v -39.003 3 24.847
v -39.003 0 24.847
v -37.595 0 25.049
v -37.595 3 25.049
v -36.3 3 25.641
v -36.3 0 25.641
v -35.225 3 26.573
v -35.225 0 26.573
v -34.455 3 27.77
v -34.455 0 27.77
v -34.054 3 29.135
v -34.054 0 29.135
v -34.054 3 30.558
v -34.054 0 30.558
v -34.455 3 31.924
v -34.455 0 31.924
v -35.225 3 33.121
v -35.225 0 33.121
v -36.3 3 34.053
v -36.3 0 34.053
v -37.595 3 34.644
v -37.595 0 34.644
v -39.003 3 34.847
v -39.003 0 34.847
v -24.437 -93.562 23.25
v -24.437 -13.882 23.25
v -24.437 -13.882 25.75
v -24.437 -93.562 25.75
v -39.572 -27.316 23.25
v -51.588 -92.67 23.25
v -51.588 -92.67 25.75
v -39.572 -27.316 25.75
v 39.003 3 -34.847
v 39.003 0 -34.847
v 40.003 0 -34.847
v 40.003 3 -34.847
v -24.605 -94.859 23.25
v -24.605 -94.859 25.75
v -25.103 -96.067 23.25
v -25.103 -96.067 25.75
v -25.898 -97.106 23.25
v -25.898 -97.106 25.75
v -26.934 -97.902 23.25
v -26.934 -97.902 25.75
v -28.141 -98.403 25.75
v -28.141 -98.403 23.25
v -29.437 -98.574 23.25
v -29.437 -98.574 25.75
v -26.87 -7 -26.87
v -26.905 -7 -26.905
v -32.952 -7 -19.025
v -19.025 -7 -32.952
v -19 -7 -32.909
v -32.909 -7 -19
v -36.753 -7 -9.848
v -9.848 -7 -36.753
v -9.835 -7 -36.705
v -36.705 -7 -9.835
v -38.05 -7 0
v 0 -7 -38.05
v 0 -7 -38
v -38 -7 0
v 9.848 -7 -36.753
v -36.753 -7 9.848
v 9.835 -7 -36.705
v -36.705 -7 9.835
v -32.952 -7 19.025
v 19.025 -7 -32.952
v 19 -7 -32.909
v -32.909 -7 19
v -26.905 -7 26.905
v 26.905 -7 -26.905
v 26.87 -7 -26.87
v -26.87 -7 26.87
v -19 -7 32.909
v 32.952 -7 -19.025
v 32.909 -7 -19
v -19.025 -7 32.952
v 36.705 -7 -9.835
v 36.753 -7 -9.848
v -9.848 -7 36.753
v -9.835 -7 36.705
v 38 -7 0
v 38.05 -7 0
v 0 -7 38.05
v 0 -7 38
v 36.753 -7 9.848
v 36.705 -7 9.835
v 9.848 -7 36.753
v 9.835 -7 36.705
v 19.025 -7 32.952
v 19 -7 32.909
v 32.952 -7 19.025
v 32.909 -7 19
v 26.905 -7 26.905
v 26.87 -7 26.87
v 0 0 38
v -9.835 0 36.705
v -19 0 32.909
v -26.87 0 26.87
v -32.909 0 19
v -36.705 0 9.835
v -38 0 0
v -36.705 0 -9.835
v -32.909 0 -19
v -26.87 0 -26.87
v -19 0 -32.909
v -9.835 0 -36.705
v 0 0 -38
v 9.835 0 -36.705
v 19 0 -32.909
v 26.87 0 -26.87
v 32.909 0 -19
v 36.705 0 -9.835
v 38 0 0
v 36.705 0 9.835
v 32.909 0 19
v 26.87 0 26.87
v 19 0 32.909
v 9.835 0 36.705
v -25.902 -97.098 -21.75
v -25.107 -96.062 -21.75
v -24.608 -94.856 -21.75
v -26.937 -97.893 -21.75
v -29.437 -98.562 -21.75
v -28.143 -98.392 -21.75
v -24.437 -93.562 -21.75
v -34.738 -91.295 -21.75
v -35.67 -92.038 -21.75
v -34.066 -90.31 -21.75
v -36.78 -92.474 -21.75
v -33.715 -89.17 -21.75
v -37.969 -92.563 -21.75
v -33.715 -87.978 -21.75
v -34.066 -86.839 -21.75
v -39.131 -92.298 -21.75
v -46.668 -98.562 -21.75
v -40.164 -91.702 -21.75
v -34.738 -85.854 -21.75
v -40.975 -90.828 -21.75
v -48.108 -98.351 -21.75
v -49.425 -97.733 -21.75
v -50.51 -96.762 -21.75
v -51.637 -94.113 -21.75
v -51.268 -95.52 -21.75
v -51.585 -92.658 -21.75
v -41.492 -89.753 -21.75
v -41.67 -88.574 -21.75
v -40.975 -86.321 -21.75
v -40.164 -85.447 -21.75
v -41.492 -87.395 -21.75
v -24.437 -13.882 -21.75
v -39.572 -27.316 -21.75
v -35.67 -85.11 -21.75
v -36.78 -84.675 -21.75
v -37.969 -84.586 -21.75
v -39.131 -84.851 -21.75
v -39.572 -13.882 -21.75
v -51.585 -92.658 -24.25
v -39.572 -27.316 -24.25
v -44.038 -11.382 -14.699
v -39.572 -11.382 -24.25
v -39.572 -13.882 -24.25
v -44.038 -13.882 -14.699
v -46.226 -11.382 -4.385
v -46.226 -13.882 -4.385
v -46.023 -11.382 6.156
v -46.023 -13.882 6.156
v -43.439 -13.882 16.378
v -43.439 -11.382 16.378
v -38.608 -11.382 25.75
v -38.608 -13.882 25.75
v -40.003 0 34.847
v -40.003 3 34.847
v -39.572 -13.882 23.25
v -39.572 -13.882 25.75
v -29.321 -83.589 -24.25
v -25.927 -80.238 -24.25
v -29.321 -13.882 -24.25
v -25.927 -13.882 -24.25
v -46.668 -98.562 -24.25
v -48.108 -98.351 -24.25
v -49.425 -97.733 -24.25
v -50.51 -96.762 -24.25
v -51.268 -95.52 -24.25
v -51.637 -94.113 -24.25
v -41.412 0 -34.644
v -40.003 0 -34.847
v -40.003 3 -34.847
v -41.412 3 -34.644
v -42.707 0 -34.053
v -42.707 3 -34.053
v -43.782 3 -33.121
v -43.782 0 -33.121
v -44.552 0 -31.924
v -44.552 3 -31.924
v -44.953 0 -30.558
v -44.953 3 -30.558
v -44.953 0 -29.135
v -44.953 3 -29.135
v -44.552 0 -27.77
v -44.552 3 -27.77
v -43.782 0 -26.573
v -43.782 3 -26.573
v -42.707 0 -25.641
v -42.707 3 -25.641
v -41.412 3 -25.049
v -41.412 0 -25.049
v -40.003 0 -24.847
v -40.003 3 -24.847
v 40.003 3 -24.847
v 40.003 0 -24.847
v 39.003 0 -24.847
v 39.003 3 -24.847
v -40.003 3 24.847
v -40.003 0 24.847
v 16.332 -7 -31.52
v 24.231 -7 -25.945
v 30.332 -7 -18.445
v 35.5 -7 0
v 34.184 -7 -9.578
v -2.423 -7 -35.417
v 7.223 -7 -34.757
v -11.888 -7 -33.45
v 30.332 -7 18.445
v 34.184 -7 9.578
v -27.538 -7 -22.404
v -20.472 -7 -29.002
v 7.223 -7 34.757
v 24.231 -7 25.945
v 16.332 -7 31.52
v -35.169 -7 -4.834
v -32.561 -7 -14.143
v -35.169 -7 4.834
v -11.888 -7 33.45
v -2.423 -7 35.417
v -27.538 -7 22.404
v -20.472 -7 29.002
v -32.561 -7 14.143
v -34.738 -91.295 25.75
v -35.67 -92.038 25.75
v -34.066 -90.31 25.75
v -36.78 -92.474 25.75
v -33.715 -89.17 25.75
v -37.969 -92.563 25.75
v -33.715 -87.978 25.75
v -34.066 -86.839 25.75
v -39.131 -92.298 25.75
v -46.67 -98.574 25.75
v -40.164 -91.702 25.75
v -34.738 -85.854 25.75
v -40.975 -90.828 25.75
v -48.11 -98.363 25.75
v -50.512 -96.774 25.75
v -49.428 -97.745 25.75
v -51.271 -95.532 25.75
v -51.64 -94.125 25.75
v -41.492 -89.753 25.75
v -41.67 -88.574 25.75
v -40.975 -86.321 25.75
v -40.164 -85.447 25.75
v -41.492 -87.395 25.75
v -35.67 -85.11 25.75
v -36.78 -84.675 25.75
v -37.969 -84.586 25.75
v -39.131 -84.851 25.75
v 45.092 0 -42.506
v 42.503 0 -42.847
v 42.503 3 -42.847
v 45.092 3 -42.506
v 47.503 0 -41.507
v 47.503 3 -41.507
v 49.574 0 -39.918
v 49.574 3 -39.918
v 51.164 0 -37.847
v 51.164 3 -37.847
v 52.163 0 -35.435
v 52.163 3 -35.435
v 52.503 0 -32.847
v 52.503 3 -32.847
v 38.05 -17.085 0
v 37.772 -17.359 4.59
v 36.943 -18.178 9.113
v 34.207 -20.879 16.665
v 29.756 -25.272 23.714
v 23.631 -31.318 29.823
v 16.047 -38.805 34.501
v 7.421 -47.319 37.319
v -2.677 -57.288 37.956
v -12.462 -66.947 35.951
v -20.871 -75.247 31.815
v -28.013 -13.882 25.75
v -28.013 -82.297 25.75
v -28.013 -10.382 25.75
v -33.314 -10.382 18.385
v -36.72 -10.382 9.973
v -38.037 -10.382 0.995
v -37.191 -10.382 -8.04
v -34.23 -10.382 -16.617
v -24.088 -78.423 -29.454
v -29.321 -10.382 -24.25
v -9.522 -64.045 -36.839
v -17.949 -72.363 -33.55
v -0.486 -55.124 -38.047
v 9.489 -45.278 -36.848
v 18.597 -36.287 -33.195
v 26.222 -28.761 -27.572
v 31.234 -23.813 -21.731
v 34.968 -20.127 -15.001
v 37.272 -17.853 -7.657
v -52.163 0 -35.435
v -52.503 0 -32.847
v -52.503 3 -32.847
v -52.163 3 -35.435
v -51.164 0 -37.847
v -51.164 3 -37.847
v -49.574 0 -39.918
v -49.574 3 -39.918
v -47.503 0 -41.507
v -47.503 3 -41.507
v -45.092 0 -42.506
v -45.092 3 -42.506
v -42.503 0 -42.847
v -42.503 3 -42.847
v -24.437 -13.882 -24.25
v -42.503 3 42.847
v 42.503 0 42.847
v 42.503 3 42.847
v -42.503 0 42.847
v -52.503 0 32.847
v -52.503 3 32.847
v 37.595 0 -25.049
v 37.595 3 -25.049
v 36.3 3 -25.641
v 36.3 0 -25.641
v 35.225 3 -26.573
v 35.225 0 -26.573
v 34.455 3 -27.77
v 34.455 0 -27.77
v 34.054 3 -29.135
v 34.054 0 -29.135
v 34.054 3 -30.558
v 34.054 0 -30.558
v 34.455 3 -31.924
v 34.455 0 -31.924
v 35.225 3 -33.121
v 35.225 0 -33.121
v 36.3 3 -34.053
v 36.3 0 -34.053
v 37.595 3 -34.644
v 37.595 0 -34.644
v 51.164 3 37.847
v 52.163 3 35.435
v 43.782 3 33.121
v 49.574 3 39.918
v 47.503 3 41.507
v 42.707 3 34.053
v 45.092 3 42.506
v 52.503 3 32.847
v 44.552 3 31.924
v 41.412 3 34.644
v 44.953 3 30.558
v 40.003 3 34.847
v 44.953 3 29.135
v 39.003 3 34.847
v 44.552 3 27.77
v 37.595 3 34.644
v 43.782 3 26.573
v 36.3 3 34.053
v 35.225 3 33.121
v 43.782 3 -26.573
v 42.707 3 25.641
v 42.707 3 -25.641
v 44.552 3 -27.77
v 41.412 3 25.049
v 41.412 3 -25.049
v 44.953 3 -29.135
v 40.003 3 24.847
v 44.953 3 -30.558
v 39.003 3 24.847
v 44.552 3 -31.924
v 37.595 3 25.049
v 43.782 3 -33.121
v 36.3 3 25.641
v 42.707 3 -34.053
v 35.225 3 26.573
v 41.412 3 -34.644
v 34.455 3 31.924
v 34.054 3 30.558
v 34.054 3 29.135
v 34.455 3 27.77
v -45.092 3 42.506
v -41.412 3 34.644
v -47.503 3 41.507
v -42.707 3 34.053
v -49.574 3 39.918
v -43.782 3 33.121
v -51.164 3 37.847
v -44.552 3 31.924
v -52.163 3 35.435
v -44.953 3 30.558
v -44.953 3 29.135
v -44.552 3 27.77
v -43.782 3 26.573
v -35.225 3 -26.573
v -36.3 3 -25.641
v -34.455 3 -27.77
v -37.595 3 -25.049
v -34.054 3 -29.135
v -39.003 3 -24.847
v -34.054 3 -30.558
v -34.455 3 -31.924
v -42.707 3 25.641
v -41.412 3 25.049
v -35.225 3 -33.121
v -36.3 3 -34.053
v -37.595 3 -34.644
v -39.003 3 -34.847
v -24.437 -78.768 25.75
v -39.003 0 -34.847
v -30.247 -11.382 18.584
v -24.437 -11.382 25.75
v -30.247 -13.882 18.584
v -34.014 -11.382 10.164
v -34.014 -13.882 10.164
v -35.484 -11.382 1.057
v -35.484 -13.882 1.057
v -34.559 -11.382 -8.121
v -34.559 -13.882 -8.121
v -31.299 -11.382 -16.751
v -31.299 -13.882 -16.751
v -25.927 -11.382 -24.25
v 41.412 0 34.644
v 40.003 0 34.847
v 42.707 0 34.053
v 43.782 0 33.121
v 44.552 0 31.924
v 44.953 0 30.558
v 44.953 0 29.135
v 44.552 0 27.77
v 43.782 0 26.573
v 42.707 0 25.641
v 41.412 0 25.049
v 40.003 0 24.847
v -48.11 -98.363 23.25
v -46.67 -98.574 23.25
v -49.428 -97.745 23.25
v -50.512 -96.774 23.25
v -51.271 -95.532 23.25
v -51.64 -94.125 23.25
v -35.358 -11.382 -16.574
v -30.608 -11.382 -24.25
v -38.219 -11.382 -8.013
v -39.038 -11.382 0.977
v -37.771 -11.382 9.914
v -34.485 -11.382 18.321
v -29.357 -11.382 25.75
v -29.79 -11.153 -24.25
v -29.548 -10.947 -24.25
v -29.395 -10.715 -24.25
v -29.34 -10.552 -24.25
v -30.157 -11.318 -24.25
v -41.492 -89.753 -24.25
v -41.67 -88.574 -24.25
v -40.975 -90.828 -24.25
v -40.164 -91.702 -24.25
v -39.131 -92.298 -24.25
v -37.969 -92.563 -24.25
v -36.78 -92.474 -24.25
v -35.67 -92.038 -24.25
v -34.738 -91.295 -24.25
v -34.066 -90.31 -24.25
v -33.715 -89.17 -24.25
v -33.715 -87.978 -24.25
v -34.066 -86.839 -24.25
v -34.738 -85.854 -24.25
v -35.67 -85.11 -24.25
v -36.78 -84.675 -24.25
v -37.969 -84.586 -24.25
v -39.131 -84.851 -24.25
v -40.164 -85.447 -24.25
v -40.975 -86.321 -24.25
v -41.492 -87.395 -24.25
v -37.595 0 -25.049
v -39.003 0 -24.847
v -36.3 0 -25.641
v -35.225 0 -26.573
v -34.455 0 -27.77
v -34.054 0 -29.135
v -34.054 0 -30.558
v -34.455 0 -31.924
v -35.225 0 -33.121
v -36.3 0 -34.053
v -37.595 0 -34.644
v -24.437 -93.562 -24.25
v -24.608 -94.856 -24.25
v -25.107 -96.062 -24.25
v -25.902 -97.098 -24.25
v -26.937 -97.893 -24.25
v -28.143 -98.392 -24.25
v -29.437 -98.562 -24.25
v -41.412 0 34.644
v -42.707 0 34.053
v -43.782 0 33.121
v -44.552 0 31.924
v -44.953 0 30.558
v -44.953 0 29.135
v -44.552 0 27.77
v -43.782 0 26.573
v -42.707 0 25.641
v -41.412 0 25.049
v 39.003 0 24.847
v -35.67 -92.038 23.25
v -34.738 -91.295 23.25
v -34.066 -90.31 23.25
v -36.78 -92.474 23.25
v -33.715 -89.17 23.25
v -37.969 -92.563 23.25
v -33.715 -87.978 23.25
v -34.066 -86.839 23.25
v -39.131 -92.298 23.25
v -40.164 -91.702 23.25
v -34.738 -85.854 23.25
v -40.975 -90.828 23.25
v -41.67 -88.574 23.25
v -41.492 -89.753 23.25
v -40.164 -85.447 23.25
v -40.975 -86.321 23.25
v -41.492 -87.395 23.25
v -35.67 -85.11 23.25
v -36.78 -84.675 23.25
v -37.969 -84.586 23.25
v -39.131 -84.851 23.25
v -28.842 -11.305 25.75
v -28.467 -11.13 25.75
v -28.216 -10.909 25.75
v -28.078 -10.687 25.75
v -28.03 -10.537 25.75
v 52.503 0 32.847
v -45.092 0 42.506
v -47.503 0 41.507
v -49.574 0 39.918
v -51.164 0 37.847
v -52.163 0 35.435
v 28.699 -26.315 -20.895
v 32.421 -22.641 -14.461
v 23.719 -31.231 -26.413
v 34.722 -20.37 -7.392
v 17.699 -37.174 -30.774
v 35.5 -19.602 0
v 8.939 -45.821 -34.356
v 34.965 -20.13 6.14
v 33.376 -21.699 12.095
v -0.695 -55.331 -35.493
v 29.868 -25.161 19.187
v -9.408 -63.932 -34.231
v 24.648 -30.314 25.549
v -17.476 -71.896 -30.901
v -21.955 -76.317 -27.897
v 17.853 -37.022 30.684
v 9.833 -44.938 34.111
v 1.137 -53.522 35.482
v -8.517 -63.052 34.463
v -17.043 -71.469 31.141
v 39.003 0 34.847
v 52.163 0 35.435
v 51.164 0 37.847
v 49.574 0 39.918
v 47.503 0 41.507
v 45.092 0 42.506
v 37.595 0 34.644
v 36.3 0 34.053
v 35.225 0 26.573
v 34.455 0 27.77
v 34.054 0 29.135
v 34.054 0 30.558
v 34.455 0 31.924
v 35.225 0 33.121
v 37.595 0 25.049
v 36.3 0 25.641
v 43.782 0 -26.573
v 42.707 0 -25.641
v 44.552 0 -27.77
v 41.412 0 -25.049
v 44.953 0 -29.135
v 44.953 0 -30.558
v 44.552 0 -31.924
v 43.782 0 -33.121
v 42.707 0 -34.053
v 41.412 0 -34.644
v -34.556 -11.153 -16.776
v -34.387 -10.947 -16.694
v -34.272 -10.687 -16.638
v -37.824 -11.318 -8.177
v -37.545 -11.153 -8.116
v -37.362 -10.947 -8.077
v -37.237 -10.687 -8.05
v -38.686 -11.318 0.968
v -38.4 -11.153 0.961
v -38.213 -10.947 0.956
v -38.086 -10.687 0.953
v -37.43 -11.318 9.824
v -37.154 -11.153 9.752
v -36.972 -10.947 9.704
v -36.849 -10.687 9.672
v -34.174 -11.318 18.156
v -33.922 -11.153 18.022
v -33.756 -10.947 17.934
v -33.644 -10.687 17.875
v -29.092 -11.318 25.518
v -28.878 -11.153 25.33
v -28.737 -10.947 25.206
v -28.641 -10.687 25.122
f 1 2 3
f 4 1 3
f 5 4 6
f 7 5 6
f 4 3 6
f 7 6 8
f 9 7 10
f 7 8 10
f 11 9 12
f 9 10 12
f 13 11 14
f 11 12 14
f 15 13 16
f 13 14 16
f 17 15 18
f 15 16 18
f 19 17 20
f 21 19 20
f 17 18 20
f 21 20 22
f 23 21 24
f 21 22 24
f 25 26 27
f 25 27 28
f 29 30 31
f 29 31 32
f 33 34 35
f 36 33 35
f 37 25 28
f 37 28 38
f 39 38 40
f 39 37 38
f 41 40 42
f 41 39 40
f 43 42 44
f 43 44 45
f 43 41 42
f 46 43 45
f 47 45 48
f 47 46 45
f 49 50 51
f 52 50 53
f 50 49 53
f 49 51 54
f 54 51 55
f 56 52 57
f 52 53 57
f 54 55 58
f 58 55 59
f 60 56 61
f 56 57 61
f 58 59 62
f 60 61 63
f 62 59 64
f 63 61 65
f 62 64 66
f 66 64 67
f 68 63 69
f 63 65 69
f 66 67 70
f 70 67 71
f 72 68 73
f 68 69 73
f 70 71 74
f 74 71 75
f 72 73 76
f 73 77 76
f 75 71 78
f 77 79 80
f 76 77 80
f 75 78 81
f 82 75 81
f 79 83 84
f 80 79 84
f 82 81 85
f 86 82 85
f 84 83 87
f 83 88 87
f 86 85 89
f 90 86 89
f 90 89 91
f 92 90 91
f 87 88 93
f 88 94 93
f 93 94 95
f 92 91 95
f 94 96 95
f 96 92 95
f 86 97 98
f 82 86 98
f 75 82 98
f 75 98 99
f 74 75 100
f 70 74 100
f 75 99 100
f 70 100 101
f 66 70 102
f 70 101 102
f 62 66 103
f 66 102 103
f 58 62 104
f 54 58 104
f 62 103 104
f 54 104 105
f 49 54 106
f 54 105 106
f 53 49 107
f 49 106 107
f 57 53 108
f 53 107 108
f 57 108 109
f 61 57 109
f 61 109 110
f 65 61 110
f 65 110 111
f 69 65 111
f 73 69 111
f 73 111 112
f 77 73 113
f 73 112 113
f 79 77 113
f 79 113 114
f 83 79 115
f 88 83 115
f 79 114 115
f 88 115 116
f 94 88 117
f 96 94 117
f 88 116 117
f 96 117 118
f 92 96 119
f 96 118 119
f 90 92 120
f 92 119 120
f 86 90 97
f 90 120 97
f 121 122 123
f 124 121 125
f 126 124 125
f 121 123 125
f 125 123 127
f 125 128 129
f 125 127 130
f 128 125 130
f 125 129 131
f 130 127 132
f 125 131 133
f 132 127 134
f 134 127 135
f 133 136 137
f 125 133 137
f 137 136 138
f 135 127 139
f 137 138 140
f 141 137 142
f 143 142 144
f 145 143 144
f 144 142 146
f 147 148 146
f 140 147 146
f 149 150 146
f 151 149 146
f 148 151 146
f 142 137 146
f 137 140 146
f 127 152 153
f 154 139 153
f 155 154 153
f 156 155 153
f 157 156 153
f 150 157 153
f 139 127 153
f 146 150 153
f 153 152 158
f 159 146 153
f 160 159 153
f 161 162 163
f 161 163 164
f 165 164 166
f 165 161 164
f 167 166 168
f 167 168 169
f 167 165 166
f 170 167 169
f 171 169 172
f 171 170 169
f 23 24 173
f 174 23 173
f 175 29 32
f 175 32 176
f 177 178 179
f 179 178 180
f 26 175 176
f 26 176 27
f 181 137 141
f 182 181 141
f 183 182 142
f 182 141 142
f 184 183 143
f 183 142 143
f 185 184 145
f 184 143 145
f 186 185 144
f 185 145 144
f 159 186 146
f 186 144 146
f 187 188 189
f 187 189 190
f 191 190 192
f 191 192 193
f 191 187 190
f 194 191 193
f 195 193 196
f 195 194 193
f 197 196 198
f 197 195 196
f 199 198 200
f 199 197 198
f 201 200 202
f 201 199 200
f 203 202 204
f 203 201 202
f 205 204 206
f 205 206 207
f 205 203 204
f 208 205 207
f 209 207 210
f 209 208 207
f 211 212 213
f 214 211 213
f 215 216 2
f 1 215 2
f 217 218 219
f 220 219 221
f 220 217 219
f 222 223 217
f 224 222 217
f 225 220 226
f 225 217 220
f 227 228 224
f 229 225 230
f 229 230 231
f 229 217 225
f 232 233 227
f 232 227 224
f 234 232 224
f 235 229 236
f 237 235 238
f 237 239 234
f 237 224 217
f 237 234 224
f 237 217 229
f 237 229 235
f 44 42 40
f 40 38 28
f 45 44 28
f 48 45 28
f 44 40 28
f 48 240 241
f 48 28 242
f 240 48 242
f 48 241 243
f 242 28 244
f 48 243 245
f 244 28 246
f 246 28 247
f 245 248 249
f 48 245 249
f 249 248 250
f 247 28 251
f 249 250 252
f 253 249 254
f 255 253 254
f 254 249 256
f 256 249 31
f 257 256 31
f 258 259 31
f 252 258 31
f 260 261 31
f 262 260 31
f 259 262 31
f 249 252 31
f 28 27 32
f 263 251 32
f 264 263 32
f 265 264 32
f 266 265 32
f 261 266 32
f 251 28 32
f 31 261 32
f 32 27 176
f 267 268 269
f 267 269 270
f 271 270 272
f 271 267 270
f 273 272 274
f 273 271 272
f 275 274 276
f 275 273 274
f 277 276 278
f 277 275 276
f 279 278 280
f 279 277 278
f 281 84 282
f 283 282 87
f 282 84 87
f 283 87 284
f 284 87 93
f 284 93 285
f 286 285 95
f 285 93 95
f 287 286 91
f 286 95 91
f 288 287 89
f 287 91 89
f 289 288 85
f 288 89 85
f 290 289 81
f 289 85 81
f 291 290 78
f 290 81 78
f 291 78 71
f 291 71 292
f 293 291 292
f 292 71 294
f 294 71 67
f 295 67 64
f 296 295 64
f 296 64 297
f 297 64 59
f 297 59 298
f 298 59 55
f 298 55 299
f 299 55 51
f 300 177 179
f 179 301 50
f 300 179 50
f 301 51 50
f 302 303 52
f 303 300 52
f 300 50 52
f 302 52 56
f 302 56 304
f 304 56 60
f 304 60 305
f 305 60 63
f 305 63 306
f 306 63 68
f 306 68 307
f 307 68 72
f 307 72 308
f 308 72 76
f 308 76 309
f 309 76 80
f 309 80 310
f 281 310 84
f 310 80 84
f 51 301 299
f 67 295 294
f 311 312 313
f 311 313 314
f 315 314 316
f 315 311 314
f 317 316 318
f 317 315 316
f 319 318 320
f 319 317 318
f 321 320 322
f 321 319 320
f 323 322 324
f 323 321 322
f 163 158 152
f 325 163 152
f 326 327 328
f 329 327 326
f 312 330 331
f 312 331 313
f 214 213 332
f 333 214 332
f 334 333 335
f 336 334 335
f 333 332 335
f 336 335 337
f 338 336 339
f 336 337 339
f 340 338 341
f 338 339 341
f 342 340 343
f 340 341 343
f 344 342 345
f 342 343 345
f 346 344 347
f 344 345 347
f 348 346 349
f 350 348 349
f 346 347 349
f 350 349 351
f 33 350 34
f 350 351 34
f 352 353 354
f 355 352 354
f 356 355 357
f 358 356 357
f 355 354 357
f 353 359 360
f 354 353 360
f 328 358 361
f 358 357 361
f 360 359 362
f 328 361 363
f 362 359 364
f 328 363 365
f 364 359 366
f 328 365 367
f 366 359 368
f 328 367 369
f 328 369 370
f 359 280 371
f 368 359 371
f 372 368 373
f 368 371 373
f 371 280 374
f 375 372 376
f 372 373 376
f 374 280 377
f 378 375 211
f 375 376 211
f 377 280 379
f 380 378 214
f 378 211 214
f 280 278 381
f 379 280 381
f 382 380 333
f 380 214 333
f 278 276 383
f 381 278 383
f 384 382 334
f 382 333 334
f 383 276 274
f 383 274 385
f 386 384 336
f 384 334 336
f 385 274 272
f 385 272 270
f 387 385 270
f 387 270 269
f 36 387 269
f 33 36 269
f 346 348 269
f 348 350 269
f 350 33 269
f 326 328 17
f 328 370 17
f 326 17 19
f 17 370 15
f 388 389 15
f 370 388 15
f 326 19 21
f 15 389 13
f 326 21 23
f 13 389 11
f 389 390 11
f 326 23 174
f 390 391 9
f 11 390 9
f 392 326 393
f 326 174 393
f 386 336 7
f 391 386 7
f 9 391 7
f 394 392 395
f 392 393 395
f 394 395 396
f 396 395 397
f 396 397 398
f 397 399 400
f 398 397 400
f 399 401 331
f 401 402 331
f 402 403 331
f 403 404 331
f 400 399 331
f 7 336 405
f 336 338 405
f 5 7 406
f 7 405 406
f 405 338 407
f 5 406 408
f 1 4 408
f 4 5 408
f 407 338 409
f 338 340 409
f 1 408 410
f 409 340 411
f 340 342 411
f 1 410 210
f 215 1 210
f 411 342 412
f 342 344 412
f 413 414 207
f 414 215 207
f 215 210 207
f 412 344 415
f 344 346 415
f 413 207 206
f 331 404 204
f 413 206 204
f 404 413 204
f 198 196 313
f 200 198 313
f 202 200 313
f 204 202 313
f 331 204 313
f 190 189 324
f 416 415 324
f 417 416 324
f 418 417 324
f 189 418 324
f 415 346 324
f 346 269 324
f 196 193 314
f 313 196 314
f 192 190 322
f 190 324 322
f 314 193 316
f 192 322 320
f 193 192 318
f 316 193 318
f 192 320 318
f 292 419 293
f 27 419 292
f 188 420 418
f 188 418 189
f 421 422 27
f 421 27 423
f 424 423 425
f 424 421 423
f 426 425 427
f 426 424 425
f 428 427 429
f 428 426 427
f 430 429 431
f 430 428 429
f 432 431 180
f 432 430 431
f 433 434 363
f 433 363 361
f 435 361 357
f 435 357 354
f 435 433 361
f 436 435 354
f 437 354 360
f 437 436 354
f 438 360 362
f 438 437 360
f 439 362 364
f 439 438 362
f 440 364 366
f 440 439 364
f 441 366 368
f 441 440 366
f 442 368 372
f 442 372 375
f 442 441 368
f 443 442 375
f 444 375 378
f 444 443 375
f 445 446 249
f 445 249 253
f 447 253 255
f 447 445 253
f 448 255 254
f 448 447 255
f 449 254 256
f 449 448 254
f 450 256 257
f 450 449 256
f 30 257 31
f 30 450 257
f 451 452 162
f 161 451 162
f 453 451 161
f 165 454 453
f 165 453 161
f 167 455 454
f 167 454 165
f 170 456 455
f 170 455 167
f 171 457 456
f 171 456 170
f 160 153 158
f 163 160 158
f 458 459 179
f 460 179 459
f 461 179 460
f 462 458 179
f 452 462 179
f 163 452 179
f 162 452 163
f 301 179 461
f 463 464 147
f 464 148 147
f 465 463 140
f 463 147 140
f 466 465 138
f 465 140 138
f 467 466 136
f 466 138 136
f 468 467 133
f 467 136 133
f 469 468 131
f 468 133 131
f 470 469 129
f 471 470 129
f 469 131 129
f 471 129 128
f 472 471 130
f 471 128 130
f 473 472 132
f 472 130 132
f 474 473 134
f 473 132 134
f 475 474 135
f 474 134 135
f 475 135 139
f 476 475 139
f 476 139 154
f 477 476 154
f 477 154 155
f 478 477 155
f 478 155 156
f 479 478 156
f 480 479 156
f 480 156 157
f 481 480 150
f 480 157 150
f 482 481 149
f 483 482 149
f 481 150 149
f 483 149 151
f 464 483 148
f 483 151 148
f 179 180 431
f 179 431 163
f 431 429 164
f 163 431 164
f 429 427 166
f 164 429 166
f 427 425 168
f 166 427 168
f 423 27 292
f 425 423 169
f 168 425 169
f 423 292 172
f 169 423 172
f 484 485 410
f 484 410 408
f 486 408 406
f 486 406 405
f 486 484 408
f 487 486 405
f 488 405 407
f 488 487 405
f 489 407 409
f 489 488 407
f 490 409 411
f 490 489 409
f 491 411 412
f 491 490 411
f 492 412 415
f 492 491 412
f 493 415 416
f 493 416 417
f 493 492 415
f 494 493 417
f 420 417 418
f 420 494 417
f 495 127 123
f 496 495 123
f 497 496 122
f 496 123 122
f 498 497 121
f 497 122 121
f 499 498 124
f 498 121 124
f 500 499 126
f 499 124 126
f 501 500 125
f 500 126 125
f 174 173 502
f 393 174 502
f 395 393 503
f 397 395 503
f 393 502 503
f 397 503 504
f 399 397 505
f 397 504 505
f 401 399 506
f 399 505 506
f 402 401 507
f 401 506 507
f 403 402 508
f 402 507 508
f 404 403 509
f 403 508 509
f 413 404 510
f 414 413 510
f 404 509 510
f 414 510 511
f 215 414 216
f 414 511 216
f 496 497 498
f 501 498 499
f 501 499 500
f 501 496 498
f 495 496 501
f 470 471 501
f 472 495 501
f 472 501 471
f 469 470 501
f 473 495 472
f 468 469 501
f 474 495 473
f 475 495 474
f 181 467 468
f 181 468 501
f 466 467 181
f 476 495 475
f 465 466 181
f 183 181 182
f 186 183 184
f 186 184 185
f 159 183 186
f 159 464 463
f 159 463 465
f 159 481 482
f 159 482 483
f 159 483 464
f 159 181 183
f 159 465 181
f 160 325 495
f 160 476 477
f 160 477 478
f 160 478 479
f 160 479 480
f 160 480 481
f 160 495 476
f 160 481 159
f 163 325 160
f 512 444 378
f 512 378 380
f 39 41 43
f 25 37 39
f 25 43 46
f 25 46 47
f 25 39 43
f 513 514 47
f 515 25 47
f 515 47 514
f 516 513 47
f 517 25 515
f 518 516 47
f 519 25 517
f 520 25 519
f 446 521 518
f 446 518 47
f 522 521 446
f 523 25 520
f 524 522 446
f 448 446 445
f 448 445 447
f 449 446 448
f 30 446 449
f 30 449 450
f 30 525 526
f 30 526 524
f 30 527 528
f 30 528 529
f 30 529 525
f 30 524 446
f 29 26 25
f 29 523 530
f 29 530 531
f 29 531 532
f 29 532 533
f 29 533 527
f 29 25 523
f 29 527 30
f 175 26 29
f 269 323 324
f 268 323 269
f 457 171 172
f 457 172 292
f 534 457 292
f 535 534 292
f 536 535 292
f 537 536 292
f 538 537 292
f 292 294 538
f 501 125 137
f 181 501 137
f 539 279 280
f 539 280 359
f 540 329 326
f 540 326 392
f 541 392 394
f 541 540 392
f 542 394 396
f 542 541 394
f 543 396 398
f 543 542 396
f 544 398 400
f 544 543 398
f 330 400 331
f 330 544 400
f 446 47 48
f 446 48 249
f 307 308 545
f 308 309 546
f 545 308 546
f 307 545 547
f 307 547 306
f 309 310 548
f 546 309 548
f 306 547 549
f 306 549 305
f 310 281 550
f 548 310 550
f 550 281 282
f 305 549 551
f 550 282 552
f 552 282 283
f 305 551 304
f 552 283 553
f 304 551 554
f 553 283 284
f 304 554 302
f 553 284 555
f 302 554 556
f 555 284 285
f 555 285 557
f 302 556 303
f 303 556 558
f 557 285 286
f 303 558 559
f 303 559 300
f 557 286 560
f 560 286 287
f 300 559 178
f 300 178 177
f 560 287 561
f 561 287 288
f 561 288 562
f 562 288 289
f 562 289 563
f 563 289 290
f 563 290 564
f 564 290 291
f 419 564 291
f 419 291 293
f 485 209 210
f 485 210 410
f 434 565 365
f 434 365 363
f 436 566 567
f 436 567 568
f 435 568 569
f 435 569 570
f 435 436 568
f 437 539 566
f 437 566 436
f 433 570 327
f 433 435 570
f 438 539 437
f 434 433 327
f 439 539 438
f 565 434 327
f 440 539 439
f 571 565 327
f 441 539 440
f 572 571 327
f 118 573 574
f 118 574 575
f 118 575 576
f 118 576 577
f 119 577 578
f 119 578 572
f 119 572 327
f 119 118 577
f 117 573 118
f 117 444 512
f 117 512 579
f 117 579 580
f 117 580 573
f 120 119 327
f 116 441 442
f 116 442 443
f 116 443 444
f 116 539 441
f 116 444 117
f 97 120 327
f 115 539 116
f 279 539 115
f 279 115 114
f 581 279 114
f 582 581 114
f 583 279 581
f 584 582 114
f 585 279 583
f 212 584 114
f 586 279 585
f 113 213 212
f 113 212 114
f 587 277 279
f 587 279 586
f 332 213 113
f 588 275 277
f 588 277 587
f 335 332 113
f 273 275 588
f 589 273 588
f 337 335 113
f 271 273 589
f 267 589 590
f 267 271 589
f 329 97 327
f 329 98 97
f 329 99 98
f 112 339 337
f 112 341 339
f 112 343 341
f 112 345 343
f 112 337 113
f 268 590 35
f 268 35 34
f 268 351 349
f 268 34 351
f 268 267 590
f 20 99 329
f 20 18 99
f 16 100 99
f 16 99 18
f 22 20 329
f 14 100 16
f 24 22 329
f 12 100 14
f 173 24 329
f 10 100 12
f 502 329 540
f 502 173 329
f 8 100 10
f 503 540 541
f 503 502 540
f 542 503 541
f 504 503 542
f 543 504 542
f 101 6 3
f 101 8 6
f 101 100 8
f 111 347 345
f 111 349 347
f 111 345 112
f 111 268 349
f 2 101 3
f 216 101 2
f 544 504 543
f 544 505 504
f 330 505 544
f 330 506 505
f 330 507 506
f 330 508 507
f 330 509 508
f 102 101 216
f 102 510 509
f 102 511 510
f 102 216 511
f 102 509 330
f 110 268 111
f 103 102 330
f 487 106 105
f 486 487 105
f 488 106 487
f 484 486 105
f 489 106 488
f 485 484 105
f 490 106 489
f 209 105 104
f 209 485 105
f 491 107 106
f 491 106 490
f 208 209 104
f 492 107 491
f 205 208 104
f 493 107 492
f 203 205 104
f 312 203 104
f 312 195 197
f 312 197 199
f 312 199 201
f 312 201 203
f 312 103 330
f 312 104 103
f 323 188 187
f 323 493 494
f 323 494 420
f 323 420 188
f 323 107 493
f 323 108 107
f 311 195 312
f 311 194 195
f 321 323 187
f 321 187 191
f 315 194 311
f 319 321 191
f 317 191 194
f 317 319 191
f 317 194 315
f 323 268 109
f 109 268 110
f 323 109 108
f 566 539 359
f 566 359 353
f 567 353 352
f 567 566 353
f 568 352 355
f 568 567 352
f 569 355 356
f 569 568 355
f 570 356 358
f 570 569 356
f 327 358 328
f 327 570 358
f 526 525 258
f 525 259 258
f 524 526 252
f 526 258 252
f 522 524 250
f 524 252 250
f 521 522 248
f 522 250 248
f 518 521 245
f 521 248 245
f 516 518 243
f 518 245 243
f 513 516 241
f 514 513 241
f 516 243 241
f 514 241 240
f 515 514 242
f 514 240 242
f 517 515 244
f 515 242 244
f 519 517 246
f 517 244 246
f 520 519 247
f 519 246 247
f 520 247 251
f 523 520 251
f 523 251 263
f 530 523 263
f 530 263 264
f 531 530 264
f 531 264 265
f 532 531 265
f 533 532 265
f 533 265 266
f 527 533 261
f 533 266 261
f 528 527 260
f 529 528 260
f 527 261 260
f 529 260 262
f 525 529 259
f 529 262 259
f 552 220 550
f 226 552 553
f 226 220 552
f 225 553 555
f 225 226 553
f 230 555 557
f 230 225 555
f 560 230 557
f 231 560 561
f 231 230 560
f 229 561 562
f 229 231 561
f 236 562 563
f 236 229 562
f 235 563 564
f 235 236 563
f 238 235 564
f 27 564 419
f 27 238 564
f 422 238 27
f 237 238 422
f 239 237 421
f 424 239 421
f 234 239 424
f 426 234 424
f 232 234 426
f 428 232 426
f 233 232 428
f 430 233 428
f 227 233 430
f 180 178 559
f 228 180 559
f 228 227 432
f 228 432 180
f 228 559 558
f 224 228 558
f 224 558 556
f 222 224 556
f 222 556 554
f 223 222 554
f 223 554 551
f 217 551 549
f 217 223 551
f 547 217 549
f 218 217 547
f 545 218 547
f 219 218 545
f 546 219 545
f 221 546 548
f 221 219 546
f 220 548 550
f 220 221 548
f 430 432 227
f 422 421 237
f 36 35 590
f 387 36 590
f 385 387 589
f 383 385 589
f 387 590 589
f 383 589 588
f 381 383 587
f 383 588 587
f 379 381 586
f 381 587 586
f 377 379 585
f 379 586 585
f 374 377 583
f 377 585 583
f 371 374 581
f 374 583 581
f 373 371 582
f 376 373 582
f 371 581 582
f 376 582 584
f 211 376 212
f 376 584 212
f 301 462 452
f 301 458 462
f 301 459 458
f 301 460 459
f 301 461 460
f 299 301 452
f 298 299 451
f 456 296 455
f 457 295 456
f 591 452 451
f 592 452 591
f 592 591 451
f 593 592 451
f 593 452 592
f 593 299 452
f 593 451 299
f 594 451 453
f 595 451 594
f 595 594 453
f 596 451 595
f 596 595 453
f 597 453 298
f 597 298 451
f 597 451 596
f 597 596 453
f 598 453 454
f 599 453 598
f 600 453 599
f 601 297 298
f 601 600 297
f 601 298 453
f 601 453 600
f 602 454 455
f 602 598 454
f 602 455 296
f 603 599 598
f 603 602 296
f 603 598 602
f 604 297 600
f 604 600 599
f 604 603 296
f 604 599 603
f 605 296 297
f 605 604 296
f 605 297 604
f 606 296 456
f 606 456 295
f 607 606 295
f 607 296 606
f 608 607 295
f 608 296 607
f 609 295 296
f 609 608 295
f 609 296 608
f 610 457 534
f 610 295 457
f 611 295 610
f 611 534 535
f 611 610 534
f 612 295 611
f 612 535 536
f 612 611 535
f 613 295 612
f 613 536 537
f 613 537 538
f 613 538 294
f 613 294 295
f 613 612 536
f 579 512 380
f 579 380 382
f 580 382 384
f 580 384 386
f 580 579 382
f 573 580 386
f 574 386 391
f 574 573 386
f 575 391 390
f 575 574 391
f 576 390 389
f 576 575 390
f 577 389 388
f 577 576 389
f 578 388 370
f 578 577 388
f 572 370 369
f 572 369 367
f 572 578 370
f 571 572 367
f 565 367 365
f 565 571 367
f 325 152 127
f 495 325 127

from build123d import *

# Parameters (mm, degrees)
EXTRUDE_1_DEPTH      = 3
SKETCH_2_R           = 38
EXTRUDE_2_DEPTH      = 7
SKETCH_3_R           = 38.05
SKETCH_3_R_2         = 35.5
EXTRUDE_1_2_DEPTH    = 85
CUT_EXTRUDE_3_DEPTH  = 43.5
SKETCH_5_W           = 50
SKETCH_5_H           = 94
CUT_EXTRUDE_4_DEPTH  = 47
EXTRUDE_5_DEPTH      = 2.5
FILLET_1_R           = 1
EXTRUDE_START        = -2.5
EXTRUDE_11_DEPTH     = 2.5
EXTRUDE_13_DEPTH     = 2.5
SKETCH_11_R          = 4
CUT_EXTRUDE_14_DEPTH = 36.25


with BuildPart() as part:
    # Эскиз1 → Extrude 1 (new body)
    with BuildSketch(Plane(origin=(0, 0, 0), x_dir=(1, 0, 0), z_dir=(0, 1, 0))):
        with BuildLine():
            Line((-42.503420423, 42.846855414), (42.503420423, 42.846855414))
            ThreePointArc((42.503420423, 42.846855414), (49.574488235, 39.917923226), (52.503420423, 32.846855414))
            Line((52.503420423, 32.846855414), (52.503420423, -32.846855414))
            ThreePointArc((52.503420423, -32.846855414), (49.574488235, -39.917923226), (42.503420423, -42.846855414))
            Line((42.503420423, -42.846855414), (-42.503420423, -42.846855414))
            ThreePointArc((-42.503420423, -42.846855414), (-49.574488235, -39.917923226), (-52.503420423, -32.846855414))
            Line((-52.503420423, -32.846855414), (-52.503420423, 32.846855414))
            ThreePointArc((-52.503420423, 32.846855414), (-49.574488235, 39.917923226), (-42.503420423, 42.846855414))
        make_face()
        with BuildLine():
            Line((40.003420423, 24.846855414), (39.003420423, 24.846855414))
            ThreePointArc((39.003420423, 24.846855414), (34.003420423, 29.846855414), (39.003420423, 34.846855414))
            Line((39.003420423, 34.846855414), (40.003420423, 34.846855414))
            ThreePointArc((40.003420423, 34.846855414), (45.003420423, 29.846855414), (40.003420423, 24.846855414))
        make_face(mode=Mode.SUBTRACT)
        with BuildLine():
            Line((-40.003420423, 24.846855414), (-39.003420423, 24.846855414))
            ThreePointArc((-39.003420423, 24.846855414), (-34.003420423, 29.846855414), (-39.003420423, 34.846855414))
            Line((-39.003420423, 34.846855414), (-40.003420423, 34.846855414))
            ThreePointArc((-40.003420423, 34.846855414), (-45.003420423, 29.846855414), (-40.003420423, 24.846855414))
        make_face(mode=Mode.SUBTRACT)
        with BuildLine():
            Line((40.003420423, -24.846855414), (39.003420423, -24.846855414))
            ThreePointArc((39.003420423, -24.846855414), (34.003420423, -29.846855414), (39.003420423, -34.846855414))
            Line((39.003420423, -34.846855414), (40.003420423, -34.846855414))
            ThreePointArc((40.003420423, -34.846855414), (45.003420423, -29.846855414), (40.003420423, -24.846855414))
        make_face(mode=Mode.SUBTRACT)
        with BuildLine():
            Line((-40.003420423, -24.846855414), (-39.003420423, -24.846855414))
            ThreePointArc((-39.003420423, -24.846855414), (-34.003420423, -29.846855414), (-39.003420423, -34.846855414))
            Line((-39.003420423, -34.846855414), (-40.003420423, -34.846855414))
            ThreePointArc((-40.003420423, -34.846855414), (-45.003420423, -29.846855414), (-40.003420423, -24.846855414))
        make_face(mode=Mode.SUBTRACT)
    extrude(amount=EXTRUDE_1_DEPTH)

    # Эскиз2 → Вытянуть2 (add)
    with BuildSketch(Plane.XZ):
        with Locations(Location((0, 0, 0), (0, 0, 90))):
            Circle(SKETCH_2_R)
    extrude(amount=EXTRUDE_2_DEPTH)

    # Эскиз3 → Extrude 1 2 (add)
    with BuildSketch(Plane.XZ.offset(7)):
        Circle(SKETCH_3_R)
        Circle(SKETCH_3_R_2, mode=Mode.SUBTRACT)
    extrude(amount=EXTRUDE_1_2_DEPTH)

    # Эскиз4 → Вытянуть3 (cut, symmetric)
    with BuildSketch(Plane.XY):
        Polygon((46.057165953, -9.180691219), (-39.336892278, -93.475255138), (46.057165953, -93.475255138), align=None)
    extrude(amount=CUT_EXTRUDE_3_DEPTH, both=True, mode=Mode.SUBTRACT)

    # Эскиз5 → Вытянуть4 (cut)
    with BuildSketch(Plane(origin=(0, 0, 0), x_dir=(0, 0, -1), z_dir=(1, 0, 0))):
        with Locations((-0.75, -58.382287581)):
            Rectangle(SKETCH_5_W, SKETCH_5_H)
    extrude(amount=-CUT_EXTRUDE_4_DEPTH, mode=Mode.SUBTRACT)

    # Эскиз6 → Вытянуть5 (add)
    with BuildSketch(Plane.XZ.offset(11.382287581)):
        with BuildLine():
            Line((-38.608269391, 25.75), (-24.437420077, 25.75))
            ThreePointArc((-24.437420077, 25.75), (-35.484265547, 1.056834232), (-25.926579026, -24.25))
            Line((-25.926579026, -24.25), (-39.571539531, -24.25))
            ThreePointArc((-39.571539531, -24.25), (-46.425945172, 0.891331779), (-38.608269391, 25.75))
        make_face()
    extrude(amount=EXTRUDE_5_DEPTH)

    # Скругление1
    fillet_1_edges = [part.edges().sort_by_distance(p)[0] for p in [
        (-38.036984774, -11.382287581, 0.995132823),
    ]]
    fillet(fillet_1_edges, radius=FILLET_1_R)


with BuildPart() as body_2:
    # Эскиз8 → Вытянуть11 (new body)
    with BuildSketch(Plane(origin=(0, 0, -24.25), x_dir=(-1, 0, 0), z_dir=(0, 0, -1)).offset(EXTRUDE_START)):
        with BuildLine():
            Line((24.437420077, -13.882287581), (24.437420077, -93.562403085))
            ThreePointArc((24.437420077, -93.562403085), (25.901886171, -97.097936991), (29.437420077, -98.562403085))
            Line((29.437420077, -98.562403085), (46.667802969, -98.562403085))
            ThreePointArc((46.667802969, -98.562403085), (50.509723502, -96.762347868), (51.585376396, -92.658261731))
            Line((51.585376396, -92.658261731), (39.571539531, -27.315685955))
            Line((39.571539531, -27.315685955), (39.571539531, -13.882287581))
            Line((39.571539531, -13.882287581), (24.437420077, -13.882287581))
        make_face()
    extrude(amount=EXTRUDE_11_DEPTH)


with BuildPart() as body_3:
    # Эскиз10 → Вытянуть13 (new body)
    with BuildSketch(Plane.XY.offset(25.75).offset(EXTRUDE_START)):
        with BuildLine():
            Line((-24.437420077, -13.882287581), (-24.437420077, -93.562403085))
            ThreePointArc((-24.437420077, -93.562403085), (-25.897661253, -97.10563805), (-29.437405876, -98.574319881))
            Line((-29.437405876, -98.574319881), (-46.669993982, -98.574319881))
            ThreePointArc((-46.669993982, -98.574319881), (-50.511914515, -96.774264664), (-51.587567409, -92.670178527))
            Line((-51.587567409, -92.670178527), (-39.571539531, -27.315685955))
            Line((-39.571539531, -27.315685955), (-39.571539531, -13.882287581))
            Line((-39.571539531, -13.882287581), (-24.437420077, -13.882287581))
        make_face()
    extrude(amount=EXTRUDE_13_DEPTH)


with BuildPart() as cut_extrude_14_tool:
    # Эскиз11 → Вытянуть14 (new, symmetric)
    with BuildSketch(Plane.XY):
        with Locations(Location((-37.669993982, -88.574319881, 0), (0, 0, 180))):
            Circle(SKETCH_11_R)
    extrude(amount=CUT_EXTRUDE_14_DEPTH, both=True)


with BuildPart() as body_2_1:
    add(body_2.part)

    # Вытянуть14: cut by cut_extrude_14_tool
    add(cut_extrude_14_tool.part, mode=Mode.SUBTRACT)


with BuildPart() as body_3_1:
    add(body_3.part)

    # Вытянуть14: cut by cut_extrude_14_tool
    add(cut_extrude_14_tool.part, mode=Mode.SUBTRACT)


solid = Compound([part.part, body_2_1.part, body_3_1.part])
